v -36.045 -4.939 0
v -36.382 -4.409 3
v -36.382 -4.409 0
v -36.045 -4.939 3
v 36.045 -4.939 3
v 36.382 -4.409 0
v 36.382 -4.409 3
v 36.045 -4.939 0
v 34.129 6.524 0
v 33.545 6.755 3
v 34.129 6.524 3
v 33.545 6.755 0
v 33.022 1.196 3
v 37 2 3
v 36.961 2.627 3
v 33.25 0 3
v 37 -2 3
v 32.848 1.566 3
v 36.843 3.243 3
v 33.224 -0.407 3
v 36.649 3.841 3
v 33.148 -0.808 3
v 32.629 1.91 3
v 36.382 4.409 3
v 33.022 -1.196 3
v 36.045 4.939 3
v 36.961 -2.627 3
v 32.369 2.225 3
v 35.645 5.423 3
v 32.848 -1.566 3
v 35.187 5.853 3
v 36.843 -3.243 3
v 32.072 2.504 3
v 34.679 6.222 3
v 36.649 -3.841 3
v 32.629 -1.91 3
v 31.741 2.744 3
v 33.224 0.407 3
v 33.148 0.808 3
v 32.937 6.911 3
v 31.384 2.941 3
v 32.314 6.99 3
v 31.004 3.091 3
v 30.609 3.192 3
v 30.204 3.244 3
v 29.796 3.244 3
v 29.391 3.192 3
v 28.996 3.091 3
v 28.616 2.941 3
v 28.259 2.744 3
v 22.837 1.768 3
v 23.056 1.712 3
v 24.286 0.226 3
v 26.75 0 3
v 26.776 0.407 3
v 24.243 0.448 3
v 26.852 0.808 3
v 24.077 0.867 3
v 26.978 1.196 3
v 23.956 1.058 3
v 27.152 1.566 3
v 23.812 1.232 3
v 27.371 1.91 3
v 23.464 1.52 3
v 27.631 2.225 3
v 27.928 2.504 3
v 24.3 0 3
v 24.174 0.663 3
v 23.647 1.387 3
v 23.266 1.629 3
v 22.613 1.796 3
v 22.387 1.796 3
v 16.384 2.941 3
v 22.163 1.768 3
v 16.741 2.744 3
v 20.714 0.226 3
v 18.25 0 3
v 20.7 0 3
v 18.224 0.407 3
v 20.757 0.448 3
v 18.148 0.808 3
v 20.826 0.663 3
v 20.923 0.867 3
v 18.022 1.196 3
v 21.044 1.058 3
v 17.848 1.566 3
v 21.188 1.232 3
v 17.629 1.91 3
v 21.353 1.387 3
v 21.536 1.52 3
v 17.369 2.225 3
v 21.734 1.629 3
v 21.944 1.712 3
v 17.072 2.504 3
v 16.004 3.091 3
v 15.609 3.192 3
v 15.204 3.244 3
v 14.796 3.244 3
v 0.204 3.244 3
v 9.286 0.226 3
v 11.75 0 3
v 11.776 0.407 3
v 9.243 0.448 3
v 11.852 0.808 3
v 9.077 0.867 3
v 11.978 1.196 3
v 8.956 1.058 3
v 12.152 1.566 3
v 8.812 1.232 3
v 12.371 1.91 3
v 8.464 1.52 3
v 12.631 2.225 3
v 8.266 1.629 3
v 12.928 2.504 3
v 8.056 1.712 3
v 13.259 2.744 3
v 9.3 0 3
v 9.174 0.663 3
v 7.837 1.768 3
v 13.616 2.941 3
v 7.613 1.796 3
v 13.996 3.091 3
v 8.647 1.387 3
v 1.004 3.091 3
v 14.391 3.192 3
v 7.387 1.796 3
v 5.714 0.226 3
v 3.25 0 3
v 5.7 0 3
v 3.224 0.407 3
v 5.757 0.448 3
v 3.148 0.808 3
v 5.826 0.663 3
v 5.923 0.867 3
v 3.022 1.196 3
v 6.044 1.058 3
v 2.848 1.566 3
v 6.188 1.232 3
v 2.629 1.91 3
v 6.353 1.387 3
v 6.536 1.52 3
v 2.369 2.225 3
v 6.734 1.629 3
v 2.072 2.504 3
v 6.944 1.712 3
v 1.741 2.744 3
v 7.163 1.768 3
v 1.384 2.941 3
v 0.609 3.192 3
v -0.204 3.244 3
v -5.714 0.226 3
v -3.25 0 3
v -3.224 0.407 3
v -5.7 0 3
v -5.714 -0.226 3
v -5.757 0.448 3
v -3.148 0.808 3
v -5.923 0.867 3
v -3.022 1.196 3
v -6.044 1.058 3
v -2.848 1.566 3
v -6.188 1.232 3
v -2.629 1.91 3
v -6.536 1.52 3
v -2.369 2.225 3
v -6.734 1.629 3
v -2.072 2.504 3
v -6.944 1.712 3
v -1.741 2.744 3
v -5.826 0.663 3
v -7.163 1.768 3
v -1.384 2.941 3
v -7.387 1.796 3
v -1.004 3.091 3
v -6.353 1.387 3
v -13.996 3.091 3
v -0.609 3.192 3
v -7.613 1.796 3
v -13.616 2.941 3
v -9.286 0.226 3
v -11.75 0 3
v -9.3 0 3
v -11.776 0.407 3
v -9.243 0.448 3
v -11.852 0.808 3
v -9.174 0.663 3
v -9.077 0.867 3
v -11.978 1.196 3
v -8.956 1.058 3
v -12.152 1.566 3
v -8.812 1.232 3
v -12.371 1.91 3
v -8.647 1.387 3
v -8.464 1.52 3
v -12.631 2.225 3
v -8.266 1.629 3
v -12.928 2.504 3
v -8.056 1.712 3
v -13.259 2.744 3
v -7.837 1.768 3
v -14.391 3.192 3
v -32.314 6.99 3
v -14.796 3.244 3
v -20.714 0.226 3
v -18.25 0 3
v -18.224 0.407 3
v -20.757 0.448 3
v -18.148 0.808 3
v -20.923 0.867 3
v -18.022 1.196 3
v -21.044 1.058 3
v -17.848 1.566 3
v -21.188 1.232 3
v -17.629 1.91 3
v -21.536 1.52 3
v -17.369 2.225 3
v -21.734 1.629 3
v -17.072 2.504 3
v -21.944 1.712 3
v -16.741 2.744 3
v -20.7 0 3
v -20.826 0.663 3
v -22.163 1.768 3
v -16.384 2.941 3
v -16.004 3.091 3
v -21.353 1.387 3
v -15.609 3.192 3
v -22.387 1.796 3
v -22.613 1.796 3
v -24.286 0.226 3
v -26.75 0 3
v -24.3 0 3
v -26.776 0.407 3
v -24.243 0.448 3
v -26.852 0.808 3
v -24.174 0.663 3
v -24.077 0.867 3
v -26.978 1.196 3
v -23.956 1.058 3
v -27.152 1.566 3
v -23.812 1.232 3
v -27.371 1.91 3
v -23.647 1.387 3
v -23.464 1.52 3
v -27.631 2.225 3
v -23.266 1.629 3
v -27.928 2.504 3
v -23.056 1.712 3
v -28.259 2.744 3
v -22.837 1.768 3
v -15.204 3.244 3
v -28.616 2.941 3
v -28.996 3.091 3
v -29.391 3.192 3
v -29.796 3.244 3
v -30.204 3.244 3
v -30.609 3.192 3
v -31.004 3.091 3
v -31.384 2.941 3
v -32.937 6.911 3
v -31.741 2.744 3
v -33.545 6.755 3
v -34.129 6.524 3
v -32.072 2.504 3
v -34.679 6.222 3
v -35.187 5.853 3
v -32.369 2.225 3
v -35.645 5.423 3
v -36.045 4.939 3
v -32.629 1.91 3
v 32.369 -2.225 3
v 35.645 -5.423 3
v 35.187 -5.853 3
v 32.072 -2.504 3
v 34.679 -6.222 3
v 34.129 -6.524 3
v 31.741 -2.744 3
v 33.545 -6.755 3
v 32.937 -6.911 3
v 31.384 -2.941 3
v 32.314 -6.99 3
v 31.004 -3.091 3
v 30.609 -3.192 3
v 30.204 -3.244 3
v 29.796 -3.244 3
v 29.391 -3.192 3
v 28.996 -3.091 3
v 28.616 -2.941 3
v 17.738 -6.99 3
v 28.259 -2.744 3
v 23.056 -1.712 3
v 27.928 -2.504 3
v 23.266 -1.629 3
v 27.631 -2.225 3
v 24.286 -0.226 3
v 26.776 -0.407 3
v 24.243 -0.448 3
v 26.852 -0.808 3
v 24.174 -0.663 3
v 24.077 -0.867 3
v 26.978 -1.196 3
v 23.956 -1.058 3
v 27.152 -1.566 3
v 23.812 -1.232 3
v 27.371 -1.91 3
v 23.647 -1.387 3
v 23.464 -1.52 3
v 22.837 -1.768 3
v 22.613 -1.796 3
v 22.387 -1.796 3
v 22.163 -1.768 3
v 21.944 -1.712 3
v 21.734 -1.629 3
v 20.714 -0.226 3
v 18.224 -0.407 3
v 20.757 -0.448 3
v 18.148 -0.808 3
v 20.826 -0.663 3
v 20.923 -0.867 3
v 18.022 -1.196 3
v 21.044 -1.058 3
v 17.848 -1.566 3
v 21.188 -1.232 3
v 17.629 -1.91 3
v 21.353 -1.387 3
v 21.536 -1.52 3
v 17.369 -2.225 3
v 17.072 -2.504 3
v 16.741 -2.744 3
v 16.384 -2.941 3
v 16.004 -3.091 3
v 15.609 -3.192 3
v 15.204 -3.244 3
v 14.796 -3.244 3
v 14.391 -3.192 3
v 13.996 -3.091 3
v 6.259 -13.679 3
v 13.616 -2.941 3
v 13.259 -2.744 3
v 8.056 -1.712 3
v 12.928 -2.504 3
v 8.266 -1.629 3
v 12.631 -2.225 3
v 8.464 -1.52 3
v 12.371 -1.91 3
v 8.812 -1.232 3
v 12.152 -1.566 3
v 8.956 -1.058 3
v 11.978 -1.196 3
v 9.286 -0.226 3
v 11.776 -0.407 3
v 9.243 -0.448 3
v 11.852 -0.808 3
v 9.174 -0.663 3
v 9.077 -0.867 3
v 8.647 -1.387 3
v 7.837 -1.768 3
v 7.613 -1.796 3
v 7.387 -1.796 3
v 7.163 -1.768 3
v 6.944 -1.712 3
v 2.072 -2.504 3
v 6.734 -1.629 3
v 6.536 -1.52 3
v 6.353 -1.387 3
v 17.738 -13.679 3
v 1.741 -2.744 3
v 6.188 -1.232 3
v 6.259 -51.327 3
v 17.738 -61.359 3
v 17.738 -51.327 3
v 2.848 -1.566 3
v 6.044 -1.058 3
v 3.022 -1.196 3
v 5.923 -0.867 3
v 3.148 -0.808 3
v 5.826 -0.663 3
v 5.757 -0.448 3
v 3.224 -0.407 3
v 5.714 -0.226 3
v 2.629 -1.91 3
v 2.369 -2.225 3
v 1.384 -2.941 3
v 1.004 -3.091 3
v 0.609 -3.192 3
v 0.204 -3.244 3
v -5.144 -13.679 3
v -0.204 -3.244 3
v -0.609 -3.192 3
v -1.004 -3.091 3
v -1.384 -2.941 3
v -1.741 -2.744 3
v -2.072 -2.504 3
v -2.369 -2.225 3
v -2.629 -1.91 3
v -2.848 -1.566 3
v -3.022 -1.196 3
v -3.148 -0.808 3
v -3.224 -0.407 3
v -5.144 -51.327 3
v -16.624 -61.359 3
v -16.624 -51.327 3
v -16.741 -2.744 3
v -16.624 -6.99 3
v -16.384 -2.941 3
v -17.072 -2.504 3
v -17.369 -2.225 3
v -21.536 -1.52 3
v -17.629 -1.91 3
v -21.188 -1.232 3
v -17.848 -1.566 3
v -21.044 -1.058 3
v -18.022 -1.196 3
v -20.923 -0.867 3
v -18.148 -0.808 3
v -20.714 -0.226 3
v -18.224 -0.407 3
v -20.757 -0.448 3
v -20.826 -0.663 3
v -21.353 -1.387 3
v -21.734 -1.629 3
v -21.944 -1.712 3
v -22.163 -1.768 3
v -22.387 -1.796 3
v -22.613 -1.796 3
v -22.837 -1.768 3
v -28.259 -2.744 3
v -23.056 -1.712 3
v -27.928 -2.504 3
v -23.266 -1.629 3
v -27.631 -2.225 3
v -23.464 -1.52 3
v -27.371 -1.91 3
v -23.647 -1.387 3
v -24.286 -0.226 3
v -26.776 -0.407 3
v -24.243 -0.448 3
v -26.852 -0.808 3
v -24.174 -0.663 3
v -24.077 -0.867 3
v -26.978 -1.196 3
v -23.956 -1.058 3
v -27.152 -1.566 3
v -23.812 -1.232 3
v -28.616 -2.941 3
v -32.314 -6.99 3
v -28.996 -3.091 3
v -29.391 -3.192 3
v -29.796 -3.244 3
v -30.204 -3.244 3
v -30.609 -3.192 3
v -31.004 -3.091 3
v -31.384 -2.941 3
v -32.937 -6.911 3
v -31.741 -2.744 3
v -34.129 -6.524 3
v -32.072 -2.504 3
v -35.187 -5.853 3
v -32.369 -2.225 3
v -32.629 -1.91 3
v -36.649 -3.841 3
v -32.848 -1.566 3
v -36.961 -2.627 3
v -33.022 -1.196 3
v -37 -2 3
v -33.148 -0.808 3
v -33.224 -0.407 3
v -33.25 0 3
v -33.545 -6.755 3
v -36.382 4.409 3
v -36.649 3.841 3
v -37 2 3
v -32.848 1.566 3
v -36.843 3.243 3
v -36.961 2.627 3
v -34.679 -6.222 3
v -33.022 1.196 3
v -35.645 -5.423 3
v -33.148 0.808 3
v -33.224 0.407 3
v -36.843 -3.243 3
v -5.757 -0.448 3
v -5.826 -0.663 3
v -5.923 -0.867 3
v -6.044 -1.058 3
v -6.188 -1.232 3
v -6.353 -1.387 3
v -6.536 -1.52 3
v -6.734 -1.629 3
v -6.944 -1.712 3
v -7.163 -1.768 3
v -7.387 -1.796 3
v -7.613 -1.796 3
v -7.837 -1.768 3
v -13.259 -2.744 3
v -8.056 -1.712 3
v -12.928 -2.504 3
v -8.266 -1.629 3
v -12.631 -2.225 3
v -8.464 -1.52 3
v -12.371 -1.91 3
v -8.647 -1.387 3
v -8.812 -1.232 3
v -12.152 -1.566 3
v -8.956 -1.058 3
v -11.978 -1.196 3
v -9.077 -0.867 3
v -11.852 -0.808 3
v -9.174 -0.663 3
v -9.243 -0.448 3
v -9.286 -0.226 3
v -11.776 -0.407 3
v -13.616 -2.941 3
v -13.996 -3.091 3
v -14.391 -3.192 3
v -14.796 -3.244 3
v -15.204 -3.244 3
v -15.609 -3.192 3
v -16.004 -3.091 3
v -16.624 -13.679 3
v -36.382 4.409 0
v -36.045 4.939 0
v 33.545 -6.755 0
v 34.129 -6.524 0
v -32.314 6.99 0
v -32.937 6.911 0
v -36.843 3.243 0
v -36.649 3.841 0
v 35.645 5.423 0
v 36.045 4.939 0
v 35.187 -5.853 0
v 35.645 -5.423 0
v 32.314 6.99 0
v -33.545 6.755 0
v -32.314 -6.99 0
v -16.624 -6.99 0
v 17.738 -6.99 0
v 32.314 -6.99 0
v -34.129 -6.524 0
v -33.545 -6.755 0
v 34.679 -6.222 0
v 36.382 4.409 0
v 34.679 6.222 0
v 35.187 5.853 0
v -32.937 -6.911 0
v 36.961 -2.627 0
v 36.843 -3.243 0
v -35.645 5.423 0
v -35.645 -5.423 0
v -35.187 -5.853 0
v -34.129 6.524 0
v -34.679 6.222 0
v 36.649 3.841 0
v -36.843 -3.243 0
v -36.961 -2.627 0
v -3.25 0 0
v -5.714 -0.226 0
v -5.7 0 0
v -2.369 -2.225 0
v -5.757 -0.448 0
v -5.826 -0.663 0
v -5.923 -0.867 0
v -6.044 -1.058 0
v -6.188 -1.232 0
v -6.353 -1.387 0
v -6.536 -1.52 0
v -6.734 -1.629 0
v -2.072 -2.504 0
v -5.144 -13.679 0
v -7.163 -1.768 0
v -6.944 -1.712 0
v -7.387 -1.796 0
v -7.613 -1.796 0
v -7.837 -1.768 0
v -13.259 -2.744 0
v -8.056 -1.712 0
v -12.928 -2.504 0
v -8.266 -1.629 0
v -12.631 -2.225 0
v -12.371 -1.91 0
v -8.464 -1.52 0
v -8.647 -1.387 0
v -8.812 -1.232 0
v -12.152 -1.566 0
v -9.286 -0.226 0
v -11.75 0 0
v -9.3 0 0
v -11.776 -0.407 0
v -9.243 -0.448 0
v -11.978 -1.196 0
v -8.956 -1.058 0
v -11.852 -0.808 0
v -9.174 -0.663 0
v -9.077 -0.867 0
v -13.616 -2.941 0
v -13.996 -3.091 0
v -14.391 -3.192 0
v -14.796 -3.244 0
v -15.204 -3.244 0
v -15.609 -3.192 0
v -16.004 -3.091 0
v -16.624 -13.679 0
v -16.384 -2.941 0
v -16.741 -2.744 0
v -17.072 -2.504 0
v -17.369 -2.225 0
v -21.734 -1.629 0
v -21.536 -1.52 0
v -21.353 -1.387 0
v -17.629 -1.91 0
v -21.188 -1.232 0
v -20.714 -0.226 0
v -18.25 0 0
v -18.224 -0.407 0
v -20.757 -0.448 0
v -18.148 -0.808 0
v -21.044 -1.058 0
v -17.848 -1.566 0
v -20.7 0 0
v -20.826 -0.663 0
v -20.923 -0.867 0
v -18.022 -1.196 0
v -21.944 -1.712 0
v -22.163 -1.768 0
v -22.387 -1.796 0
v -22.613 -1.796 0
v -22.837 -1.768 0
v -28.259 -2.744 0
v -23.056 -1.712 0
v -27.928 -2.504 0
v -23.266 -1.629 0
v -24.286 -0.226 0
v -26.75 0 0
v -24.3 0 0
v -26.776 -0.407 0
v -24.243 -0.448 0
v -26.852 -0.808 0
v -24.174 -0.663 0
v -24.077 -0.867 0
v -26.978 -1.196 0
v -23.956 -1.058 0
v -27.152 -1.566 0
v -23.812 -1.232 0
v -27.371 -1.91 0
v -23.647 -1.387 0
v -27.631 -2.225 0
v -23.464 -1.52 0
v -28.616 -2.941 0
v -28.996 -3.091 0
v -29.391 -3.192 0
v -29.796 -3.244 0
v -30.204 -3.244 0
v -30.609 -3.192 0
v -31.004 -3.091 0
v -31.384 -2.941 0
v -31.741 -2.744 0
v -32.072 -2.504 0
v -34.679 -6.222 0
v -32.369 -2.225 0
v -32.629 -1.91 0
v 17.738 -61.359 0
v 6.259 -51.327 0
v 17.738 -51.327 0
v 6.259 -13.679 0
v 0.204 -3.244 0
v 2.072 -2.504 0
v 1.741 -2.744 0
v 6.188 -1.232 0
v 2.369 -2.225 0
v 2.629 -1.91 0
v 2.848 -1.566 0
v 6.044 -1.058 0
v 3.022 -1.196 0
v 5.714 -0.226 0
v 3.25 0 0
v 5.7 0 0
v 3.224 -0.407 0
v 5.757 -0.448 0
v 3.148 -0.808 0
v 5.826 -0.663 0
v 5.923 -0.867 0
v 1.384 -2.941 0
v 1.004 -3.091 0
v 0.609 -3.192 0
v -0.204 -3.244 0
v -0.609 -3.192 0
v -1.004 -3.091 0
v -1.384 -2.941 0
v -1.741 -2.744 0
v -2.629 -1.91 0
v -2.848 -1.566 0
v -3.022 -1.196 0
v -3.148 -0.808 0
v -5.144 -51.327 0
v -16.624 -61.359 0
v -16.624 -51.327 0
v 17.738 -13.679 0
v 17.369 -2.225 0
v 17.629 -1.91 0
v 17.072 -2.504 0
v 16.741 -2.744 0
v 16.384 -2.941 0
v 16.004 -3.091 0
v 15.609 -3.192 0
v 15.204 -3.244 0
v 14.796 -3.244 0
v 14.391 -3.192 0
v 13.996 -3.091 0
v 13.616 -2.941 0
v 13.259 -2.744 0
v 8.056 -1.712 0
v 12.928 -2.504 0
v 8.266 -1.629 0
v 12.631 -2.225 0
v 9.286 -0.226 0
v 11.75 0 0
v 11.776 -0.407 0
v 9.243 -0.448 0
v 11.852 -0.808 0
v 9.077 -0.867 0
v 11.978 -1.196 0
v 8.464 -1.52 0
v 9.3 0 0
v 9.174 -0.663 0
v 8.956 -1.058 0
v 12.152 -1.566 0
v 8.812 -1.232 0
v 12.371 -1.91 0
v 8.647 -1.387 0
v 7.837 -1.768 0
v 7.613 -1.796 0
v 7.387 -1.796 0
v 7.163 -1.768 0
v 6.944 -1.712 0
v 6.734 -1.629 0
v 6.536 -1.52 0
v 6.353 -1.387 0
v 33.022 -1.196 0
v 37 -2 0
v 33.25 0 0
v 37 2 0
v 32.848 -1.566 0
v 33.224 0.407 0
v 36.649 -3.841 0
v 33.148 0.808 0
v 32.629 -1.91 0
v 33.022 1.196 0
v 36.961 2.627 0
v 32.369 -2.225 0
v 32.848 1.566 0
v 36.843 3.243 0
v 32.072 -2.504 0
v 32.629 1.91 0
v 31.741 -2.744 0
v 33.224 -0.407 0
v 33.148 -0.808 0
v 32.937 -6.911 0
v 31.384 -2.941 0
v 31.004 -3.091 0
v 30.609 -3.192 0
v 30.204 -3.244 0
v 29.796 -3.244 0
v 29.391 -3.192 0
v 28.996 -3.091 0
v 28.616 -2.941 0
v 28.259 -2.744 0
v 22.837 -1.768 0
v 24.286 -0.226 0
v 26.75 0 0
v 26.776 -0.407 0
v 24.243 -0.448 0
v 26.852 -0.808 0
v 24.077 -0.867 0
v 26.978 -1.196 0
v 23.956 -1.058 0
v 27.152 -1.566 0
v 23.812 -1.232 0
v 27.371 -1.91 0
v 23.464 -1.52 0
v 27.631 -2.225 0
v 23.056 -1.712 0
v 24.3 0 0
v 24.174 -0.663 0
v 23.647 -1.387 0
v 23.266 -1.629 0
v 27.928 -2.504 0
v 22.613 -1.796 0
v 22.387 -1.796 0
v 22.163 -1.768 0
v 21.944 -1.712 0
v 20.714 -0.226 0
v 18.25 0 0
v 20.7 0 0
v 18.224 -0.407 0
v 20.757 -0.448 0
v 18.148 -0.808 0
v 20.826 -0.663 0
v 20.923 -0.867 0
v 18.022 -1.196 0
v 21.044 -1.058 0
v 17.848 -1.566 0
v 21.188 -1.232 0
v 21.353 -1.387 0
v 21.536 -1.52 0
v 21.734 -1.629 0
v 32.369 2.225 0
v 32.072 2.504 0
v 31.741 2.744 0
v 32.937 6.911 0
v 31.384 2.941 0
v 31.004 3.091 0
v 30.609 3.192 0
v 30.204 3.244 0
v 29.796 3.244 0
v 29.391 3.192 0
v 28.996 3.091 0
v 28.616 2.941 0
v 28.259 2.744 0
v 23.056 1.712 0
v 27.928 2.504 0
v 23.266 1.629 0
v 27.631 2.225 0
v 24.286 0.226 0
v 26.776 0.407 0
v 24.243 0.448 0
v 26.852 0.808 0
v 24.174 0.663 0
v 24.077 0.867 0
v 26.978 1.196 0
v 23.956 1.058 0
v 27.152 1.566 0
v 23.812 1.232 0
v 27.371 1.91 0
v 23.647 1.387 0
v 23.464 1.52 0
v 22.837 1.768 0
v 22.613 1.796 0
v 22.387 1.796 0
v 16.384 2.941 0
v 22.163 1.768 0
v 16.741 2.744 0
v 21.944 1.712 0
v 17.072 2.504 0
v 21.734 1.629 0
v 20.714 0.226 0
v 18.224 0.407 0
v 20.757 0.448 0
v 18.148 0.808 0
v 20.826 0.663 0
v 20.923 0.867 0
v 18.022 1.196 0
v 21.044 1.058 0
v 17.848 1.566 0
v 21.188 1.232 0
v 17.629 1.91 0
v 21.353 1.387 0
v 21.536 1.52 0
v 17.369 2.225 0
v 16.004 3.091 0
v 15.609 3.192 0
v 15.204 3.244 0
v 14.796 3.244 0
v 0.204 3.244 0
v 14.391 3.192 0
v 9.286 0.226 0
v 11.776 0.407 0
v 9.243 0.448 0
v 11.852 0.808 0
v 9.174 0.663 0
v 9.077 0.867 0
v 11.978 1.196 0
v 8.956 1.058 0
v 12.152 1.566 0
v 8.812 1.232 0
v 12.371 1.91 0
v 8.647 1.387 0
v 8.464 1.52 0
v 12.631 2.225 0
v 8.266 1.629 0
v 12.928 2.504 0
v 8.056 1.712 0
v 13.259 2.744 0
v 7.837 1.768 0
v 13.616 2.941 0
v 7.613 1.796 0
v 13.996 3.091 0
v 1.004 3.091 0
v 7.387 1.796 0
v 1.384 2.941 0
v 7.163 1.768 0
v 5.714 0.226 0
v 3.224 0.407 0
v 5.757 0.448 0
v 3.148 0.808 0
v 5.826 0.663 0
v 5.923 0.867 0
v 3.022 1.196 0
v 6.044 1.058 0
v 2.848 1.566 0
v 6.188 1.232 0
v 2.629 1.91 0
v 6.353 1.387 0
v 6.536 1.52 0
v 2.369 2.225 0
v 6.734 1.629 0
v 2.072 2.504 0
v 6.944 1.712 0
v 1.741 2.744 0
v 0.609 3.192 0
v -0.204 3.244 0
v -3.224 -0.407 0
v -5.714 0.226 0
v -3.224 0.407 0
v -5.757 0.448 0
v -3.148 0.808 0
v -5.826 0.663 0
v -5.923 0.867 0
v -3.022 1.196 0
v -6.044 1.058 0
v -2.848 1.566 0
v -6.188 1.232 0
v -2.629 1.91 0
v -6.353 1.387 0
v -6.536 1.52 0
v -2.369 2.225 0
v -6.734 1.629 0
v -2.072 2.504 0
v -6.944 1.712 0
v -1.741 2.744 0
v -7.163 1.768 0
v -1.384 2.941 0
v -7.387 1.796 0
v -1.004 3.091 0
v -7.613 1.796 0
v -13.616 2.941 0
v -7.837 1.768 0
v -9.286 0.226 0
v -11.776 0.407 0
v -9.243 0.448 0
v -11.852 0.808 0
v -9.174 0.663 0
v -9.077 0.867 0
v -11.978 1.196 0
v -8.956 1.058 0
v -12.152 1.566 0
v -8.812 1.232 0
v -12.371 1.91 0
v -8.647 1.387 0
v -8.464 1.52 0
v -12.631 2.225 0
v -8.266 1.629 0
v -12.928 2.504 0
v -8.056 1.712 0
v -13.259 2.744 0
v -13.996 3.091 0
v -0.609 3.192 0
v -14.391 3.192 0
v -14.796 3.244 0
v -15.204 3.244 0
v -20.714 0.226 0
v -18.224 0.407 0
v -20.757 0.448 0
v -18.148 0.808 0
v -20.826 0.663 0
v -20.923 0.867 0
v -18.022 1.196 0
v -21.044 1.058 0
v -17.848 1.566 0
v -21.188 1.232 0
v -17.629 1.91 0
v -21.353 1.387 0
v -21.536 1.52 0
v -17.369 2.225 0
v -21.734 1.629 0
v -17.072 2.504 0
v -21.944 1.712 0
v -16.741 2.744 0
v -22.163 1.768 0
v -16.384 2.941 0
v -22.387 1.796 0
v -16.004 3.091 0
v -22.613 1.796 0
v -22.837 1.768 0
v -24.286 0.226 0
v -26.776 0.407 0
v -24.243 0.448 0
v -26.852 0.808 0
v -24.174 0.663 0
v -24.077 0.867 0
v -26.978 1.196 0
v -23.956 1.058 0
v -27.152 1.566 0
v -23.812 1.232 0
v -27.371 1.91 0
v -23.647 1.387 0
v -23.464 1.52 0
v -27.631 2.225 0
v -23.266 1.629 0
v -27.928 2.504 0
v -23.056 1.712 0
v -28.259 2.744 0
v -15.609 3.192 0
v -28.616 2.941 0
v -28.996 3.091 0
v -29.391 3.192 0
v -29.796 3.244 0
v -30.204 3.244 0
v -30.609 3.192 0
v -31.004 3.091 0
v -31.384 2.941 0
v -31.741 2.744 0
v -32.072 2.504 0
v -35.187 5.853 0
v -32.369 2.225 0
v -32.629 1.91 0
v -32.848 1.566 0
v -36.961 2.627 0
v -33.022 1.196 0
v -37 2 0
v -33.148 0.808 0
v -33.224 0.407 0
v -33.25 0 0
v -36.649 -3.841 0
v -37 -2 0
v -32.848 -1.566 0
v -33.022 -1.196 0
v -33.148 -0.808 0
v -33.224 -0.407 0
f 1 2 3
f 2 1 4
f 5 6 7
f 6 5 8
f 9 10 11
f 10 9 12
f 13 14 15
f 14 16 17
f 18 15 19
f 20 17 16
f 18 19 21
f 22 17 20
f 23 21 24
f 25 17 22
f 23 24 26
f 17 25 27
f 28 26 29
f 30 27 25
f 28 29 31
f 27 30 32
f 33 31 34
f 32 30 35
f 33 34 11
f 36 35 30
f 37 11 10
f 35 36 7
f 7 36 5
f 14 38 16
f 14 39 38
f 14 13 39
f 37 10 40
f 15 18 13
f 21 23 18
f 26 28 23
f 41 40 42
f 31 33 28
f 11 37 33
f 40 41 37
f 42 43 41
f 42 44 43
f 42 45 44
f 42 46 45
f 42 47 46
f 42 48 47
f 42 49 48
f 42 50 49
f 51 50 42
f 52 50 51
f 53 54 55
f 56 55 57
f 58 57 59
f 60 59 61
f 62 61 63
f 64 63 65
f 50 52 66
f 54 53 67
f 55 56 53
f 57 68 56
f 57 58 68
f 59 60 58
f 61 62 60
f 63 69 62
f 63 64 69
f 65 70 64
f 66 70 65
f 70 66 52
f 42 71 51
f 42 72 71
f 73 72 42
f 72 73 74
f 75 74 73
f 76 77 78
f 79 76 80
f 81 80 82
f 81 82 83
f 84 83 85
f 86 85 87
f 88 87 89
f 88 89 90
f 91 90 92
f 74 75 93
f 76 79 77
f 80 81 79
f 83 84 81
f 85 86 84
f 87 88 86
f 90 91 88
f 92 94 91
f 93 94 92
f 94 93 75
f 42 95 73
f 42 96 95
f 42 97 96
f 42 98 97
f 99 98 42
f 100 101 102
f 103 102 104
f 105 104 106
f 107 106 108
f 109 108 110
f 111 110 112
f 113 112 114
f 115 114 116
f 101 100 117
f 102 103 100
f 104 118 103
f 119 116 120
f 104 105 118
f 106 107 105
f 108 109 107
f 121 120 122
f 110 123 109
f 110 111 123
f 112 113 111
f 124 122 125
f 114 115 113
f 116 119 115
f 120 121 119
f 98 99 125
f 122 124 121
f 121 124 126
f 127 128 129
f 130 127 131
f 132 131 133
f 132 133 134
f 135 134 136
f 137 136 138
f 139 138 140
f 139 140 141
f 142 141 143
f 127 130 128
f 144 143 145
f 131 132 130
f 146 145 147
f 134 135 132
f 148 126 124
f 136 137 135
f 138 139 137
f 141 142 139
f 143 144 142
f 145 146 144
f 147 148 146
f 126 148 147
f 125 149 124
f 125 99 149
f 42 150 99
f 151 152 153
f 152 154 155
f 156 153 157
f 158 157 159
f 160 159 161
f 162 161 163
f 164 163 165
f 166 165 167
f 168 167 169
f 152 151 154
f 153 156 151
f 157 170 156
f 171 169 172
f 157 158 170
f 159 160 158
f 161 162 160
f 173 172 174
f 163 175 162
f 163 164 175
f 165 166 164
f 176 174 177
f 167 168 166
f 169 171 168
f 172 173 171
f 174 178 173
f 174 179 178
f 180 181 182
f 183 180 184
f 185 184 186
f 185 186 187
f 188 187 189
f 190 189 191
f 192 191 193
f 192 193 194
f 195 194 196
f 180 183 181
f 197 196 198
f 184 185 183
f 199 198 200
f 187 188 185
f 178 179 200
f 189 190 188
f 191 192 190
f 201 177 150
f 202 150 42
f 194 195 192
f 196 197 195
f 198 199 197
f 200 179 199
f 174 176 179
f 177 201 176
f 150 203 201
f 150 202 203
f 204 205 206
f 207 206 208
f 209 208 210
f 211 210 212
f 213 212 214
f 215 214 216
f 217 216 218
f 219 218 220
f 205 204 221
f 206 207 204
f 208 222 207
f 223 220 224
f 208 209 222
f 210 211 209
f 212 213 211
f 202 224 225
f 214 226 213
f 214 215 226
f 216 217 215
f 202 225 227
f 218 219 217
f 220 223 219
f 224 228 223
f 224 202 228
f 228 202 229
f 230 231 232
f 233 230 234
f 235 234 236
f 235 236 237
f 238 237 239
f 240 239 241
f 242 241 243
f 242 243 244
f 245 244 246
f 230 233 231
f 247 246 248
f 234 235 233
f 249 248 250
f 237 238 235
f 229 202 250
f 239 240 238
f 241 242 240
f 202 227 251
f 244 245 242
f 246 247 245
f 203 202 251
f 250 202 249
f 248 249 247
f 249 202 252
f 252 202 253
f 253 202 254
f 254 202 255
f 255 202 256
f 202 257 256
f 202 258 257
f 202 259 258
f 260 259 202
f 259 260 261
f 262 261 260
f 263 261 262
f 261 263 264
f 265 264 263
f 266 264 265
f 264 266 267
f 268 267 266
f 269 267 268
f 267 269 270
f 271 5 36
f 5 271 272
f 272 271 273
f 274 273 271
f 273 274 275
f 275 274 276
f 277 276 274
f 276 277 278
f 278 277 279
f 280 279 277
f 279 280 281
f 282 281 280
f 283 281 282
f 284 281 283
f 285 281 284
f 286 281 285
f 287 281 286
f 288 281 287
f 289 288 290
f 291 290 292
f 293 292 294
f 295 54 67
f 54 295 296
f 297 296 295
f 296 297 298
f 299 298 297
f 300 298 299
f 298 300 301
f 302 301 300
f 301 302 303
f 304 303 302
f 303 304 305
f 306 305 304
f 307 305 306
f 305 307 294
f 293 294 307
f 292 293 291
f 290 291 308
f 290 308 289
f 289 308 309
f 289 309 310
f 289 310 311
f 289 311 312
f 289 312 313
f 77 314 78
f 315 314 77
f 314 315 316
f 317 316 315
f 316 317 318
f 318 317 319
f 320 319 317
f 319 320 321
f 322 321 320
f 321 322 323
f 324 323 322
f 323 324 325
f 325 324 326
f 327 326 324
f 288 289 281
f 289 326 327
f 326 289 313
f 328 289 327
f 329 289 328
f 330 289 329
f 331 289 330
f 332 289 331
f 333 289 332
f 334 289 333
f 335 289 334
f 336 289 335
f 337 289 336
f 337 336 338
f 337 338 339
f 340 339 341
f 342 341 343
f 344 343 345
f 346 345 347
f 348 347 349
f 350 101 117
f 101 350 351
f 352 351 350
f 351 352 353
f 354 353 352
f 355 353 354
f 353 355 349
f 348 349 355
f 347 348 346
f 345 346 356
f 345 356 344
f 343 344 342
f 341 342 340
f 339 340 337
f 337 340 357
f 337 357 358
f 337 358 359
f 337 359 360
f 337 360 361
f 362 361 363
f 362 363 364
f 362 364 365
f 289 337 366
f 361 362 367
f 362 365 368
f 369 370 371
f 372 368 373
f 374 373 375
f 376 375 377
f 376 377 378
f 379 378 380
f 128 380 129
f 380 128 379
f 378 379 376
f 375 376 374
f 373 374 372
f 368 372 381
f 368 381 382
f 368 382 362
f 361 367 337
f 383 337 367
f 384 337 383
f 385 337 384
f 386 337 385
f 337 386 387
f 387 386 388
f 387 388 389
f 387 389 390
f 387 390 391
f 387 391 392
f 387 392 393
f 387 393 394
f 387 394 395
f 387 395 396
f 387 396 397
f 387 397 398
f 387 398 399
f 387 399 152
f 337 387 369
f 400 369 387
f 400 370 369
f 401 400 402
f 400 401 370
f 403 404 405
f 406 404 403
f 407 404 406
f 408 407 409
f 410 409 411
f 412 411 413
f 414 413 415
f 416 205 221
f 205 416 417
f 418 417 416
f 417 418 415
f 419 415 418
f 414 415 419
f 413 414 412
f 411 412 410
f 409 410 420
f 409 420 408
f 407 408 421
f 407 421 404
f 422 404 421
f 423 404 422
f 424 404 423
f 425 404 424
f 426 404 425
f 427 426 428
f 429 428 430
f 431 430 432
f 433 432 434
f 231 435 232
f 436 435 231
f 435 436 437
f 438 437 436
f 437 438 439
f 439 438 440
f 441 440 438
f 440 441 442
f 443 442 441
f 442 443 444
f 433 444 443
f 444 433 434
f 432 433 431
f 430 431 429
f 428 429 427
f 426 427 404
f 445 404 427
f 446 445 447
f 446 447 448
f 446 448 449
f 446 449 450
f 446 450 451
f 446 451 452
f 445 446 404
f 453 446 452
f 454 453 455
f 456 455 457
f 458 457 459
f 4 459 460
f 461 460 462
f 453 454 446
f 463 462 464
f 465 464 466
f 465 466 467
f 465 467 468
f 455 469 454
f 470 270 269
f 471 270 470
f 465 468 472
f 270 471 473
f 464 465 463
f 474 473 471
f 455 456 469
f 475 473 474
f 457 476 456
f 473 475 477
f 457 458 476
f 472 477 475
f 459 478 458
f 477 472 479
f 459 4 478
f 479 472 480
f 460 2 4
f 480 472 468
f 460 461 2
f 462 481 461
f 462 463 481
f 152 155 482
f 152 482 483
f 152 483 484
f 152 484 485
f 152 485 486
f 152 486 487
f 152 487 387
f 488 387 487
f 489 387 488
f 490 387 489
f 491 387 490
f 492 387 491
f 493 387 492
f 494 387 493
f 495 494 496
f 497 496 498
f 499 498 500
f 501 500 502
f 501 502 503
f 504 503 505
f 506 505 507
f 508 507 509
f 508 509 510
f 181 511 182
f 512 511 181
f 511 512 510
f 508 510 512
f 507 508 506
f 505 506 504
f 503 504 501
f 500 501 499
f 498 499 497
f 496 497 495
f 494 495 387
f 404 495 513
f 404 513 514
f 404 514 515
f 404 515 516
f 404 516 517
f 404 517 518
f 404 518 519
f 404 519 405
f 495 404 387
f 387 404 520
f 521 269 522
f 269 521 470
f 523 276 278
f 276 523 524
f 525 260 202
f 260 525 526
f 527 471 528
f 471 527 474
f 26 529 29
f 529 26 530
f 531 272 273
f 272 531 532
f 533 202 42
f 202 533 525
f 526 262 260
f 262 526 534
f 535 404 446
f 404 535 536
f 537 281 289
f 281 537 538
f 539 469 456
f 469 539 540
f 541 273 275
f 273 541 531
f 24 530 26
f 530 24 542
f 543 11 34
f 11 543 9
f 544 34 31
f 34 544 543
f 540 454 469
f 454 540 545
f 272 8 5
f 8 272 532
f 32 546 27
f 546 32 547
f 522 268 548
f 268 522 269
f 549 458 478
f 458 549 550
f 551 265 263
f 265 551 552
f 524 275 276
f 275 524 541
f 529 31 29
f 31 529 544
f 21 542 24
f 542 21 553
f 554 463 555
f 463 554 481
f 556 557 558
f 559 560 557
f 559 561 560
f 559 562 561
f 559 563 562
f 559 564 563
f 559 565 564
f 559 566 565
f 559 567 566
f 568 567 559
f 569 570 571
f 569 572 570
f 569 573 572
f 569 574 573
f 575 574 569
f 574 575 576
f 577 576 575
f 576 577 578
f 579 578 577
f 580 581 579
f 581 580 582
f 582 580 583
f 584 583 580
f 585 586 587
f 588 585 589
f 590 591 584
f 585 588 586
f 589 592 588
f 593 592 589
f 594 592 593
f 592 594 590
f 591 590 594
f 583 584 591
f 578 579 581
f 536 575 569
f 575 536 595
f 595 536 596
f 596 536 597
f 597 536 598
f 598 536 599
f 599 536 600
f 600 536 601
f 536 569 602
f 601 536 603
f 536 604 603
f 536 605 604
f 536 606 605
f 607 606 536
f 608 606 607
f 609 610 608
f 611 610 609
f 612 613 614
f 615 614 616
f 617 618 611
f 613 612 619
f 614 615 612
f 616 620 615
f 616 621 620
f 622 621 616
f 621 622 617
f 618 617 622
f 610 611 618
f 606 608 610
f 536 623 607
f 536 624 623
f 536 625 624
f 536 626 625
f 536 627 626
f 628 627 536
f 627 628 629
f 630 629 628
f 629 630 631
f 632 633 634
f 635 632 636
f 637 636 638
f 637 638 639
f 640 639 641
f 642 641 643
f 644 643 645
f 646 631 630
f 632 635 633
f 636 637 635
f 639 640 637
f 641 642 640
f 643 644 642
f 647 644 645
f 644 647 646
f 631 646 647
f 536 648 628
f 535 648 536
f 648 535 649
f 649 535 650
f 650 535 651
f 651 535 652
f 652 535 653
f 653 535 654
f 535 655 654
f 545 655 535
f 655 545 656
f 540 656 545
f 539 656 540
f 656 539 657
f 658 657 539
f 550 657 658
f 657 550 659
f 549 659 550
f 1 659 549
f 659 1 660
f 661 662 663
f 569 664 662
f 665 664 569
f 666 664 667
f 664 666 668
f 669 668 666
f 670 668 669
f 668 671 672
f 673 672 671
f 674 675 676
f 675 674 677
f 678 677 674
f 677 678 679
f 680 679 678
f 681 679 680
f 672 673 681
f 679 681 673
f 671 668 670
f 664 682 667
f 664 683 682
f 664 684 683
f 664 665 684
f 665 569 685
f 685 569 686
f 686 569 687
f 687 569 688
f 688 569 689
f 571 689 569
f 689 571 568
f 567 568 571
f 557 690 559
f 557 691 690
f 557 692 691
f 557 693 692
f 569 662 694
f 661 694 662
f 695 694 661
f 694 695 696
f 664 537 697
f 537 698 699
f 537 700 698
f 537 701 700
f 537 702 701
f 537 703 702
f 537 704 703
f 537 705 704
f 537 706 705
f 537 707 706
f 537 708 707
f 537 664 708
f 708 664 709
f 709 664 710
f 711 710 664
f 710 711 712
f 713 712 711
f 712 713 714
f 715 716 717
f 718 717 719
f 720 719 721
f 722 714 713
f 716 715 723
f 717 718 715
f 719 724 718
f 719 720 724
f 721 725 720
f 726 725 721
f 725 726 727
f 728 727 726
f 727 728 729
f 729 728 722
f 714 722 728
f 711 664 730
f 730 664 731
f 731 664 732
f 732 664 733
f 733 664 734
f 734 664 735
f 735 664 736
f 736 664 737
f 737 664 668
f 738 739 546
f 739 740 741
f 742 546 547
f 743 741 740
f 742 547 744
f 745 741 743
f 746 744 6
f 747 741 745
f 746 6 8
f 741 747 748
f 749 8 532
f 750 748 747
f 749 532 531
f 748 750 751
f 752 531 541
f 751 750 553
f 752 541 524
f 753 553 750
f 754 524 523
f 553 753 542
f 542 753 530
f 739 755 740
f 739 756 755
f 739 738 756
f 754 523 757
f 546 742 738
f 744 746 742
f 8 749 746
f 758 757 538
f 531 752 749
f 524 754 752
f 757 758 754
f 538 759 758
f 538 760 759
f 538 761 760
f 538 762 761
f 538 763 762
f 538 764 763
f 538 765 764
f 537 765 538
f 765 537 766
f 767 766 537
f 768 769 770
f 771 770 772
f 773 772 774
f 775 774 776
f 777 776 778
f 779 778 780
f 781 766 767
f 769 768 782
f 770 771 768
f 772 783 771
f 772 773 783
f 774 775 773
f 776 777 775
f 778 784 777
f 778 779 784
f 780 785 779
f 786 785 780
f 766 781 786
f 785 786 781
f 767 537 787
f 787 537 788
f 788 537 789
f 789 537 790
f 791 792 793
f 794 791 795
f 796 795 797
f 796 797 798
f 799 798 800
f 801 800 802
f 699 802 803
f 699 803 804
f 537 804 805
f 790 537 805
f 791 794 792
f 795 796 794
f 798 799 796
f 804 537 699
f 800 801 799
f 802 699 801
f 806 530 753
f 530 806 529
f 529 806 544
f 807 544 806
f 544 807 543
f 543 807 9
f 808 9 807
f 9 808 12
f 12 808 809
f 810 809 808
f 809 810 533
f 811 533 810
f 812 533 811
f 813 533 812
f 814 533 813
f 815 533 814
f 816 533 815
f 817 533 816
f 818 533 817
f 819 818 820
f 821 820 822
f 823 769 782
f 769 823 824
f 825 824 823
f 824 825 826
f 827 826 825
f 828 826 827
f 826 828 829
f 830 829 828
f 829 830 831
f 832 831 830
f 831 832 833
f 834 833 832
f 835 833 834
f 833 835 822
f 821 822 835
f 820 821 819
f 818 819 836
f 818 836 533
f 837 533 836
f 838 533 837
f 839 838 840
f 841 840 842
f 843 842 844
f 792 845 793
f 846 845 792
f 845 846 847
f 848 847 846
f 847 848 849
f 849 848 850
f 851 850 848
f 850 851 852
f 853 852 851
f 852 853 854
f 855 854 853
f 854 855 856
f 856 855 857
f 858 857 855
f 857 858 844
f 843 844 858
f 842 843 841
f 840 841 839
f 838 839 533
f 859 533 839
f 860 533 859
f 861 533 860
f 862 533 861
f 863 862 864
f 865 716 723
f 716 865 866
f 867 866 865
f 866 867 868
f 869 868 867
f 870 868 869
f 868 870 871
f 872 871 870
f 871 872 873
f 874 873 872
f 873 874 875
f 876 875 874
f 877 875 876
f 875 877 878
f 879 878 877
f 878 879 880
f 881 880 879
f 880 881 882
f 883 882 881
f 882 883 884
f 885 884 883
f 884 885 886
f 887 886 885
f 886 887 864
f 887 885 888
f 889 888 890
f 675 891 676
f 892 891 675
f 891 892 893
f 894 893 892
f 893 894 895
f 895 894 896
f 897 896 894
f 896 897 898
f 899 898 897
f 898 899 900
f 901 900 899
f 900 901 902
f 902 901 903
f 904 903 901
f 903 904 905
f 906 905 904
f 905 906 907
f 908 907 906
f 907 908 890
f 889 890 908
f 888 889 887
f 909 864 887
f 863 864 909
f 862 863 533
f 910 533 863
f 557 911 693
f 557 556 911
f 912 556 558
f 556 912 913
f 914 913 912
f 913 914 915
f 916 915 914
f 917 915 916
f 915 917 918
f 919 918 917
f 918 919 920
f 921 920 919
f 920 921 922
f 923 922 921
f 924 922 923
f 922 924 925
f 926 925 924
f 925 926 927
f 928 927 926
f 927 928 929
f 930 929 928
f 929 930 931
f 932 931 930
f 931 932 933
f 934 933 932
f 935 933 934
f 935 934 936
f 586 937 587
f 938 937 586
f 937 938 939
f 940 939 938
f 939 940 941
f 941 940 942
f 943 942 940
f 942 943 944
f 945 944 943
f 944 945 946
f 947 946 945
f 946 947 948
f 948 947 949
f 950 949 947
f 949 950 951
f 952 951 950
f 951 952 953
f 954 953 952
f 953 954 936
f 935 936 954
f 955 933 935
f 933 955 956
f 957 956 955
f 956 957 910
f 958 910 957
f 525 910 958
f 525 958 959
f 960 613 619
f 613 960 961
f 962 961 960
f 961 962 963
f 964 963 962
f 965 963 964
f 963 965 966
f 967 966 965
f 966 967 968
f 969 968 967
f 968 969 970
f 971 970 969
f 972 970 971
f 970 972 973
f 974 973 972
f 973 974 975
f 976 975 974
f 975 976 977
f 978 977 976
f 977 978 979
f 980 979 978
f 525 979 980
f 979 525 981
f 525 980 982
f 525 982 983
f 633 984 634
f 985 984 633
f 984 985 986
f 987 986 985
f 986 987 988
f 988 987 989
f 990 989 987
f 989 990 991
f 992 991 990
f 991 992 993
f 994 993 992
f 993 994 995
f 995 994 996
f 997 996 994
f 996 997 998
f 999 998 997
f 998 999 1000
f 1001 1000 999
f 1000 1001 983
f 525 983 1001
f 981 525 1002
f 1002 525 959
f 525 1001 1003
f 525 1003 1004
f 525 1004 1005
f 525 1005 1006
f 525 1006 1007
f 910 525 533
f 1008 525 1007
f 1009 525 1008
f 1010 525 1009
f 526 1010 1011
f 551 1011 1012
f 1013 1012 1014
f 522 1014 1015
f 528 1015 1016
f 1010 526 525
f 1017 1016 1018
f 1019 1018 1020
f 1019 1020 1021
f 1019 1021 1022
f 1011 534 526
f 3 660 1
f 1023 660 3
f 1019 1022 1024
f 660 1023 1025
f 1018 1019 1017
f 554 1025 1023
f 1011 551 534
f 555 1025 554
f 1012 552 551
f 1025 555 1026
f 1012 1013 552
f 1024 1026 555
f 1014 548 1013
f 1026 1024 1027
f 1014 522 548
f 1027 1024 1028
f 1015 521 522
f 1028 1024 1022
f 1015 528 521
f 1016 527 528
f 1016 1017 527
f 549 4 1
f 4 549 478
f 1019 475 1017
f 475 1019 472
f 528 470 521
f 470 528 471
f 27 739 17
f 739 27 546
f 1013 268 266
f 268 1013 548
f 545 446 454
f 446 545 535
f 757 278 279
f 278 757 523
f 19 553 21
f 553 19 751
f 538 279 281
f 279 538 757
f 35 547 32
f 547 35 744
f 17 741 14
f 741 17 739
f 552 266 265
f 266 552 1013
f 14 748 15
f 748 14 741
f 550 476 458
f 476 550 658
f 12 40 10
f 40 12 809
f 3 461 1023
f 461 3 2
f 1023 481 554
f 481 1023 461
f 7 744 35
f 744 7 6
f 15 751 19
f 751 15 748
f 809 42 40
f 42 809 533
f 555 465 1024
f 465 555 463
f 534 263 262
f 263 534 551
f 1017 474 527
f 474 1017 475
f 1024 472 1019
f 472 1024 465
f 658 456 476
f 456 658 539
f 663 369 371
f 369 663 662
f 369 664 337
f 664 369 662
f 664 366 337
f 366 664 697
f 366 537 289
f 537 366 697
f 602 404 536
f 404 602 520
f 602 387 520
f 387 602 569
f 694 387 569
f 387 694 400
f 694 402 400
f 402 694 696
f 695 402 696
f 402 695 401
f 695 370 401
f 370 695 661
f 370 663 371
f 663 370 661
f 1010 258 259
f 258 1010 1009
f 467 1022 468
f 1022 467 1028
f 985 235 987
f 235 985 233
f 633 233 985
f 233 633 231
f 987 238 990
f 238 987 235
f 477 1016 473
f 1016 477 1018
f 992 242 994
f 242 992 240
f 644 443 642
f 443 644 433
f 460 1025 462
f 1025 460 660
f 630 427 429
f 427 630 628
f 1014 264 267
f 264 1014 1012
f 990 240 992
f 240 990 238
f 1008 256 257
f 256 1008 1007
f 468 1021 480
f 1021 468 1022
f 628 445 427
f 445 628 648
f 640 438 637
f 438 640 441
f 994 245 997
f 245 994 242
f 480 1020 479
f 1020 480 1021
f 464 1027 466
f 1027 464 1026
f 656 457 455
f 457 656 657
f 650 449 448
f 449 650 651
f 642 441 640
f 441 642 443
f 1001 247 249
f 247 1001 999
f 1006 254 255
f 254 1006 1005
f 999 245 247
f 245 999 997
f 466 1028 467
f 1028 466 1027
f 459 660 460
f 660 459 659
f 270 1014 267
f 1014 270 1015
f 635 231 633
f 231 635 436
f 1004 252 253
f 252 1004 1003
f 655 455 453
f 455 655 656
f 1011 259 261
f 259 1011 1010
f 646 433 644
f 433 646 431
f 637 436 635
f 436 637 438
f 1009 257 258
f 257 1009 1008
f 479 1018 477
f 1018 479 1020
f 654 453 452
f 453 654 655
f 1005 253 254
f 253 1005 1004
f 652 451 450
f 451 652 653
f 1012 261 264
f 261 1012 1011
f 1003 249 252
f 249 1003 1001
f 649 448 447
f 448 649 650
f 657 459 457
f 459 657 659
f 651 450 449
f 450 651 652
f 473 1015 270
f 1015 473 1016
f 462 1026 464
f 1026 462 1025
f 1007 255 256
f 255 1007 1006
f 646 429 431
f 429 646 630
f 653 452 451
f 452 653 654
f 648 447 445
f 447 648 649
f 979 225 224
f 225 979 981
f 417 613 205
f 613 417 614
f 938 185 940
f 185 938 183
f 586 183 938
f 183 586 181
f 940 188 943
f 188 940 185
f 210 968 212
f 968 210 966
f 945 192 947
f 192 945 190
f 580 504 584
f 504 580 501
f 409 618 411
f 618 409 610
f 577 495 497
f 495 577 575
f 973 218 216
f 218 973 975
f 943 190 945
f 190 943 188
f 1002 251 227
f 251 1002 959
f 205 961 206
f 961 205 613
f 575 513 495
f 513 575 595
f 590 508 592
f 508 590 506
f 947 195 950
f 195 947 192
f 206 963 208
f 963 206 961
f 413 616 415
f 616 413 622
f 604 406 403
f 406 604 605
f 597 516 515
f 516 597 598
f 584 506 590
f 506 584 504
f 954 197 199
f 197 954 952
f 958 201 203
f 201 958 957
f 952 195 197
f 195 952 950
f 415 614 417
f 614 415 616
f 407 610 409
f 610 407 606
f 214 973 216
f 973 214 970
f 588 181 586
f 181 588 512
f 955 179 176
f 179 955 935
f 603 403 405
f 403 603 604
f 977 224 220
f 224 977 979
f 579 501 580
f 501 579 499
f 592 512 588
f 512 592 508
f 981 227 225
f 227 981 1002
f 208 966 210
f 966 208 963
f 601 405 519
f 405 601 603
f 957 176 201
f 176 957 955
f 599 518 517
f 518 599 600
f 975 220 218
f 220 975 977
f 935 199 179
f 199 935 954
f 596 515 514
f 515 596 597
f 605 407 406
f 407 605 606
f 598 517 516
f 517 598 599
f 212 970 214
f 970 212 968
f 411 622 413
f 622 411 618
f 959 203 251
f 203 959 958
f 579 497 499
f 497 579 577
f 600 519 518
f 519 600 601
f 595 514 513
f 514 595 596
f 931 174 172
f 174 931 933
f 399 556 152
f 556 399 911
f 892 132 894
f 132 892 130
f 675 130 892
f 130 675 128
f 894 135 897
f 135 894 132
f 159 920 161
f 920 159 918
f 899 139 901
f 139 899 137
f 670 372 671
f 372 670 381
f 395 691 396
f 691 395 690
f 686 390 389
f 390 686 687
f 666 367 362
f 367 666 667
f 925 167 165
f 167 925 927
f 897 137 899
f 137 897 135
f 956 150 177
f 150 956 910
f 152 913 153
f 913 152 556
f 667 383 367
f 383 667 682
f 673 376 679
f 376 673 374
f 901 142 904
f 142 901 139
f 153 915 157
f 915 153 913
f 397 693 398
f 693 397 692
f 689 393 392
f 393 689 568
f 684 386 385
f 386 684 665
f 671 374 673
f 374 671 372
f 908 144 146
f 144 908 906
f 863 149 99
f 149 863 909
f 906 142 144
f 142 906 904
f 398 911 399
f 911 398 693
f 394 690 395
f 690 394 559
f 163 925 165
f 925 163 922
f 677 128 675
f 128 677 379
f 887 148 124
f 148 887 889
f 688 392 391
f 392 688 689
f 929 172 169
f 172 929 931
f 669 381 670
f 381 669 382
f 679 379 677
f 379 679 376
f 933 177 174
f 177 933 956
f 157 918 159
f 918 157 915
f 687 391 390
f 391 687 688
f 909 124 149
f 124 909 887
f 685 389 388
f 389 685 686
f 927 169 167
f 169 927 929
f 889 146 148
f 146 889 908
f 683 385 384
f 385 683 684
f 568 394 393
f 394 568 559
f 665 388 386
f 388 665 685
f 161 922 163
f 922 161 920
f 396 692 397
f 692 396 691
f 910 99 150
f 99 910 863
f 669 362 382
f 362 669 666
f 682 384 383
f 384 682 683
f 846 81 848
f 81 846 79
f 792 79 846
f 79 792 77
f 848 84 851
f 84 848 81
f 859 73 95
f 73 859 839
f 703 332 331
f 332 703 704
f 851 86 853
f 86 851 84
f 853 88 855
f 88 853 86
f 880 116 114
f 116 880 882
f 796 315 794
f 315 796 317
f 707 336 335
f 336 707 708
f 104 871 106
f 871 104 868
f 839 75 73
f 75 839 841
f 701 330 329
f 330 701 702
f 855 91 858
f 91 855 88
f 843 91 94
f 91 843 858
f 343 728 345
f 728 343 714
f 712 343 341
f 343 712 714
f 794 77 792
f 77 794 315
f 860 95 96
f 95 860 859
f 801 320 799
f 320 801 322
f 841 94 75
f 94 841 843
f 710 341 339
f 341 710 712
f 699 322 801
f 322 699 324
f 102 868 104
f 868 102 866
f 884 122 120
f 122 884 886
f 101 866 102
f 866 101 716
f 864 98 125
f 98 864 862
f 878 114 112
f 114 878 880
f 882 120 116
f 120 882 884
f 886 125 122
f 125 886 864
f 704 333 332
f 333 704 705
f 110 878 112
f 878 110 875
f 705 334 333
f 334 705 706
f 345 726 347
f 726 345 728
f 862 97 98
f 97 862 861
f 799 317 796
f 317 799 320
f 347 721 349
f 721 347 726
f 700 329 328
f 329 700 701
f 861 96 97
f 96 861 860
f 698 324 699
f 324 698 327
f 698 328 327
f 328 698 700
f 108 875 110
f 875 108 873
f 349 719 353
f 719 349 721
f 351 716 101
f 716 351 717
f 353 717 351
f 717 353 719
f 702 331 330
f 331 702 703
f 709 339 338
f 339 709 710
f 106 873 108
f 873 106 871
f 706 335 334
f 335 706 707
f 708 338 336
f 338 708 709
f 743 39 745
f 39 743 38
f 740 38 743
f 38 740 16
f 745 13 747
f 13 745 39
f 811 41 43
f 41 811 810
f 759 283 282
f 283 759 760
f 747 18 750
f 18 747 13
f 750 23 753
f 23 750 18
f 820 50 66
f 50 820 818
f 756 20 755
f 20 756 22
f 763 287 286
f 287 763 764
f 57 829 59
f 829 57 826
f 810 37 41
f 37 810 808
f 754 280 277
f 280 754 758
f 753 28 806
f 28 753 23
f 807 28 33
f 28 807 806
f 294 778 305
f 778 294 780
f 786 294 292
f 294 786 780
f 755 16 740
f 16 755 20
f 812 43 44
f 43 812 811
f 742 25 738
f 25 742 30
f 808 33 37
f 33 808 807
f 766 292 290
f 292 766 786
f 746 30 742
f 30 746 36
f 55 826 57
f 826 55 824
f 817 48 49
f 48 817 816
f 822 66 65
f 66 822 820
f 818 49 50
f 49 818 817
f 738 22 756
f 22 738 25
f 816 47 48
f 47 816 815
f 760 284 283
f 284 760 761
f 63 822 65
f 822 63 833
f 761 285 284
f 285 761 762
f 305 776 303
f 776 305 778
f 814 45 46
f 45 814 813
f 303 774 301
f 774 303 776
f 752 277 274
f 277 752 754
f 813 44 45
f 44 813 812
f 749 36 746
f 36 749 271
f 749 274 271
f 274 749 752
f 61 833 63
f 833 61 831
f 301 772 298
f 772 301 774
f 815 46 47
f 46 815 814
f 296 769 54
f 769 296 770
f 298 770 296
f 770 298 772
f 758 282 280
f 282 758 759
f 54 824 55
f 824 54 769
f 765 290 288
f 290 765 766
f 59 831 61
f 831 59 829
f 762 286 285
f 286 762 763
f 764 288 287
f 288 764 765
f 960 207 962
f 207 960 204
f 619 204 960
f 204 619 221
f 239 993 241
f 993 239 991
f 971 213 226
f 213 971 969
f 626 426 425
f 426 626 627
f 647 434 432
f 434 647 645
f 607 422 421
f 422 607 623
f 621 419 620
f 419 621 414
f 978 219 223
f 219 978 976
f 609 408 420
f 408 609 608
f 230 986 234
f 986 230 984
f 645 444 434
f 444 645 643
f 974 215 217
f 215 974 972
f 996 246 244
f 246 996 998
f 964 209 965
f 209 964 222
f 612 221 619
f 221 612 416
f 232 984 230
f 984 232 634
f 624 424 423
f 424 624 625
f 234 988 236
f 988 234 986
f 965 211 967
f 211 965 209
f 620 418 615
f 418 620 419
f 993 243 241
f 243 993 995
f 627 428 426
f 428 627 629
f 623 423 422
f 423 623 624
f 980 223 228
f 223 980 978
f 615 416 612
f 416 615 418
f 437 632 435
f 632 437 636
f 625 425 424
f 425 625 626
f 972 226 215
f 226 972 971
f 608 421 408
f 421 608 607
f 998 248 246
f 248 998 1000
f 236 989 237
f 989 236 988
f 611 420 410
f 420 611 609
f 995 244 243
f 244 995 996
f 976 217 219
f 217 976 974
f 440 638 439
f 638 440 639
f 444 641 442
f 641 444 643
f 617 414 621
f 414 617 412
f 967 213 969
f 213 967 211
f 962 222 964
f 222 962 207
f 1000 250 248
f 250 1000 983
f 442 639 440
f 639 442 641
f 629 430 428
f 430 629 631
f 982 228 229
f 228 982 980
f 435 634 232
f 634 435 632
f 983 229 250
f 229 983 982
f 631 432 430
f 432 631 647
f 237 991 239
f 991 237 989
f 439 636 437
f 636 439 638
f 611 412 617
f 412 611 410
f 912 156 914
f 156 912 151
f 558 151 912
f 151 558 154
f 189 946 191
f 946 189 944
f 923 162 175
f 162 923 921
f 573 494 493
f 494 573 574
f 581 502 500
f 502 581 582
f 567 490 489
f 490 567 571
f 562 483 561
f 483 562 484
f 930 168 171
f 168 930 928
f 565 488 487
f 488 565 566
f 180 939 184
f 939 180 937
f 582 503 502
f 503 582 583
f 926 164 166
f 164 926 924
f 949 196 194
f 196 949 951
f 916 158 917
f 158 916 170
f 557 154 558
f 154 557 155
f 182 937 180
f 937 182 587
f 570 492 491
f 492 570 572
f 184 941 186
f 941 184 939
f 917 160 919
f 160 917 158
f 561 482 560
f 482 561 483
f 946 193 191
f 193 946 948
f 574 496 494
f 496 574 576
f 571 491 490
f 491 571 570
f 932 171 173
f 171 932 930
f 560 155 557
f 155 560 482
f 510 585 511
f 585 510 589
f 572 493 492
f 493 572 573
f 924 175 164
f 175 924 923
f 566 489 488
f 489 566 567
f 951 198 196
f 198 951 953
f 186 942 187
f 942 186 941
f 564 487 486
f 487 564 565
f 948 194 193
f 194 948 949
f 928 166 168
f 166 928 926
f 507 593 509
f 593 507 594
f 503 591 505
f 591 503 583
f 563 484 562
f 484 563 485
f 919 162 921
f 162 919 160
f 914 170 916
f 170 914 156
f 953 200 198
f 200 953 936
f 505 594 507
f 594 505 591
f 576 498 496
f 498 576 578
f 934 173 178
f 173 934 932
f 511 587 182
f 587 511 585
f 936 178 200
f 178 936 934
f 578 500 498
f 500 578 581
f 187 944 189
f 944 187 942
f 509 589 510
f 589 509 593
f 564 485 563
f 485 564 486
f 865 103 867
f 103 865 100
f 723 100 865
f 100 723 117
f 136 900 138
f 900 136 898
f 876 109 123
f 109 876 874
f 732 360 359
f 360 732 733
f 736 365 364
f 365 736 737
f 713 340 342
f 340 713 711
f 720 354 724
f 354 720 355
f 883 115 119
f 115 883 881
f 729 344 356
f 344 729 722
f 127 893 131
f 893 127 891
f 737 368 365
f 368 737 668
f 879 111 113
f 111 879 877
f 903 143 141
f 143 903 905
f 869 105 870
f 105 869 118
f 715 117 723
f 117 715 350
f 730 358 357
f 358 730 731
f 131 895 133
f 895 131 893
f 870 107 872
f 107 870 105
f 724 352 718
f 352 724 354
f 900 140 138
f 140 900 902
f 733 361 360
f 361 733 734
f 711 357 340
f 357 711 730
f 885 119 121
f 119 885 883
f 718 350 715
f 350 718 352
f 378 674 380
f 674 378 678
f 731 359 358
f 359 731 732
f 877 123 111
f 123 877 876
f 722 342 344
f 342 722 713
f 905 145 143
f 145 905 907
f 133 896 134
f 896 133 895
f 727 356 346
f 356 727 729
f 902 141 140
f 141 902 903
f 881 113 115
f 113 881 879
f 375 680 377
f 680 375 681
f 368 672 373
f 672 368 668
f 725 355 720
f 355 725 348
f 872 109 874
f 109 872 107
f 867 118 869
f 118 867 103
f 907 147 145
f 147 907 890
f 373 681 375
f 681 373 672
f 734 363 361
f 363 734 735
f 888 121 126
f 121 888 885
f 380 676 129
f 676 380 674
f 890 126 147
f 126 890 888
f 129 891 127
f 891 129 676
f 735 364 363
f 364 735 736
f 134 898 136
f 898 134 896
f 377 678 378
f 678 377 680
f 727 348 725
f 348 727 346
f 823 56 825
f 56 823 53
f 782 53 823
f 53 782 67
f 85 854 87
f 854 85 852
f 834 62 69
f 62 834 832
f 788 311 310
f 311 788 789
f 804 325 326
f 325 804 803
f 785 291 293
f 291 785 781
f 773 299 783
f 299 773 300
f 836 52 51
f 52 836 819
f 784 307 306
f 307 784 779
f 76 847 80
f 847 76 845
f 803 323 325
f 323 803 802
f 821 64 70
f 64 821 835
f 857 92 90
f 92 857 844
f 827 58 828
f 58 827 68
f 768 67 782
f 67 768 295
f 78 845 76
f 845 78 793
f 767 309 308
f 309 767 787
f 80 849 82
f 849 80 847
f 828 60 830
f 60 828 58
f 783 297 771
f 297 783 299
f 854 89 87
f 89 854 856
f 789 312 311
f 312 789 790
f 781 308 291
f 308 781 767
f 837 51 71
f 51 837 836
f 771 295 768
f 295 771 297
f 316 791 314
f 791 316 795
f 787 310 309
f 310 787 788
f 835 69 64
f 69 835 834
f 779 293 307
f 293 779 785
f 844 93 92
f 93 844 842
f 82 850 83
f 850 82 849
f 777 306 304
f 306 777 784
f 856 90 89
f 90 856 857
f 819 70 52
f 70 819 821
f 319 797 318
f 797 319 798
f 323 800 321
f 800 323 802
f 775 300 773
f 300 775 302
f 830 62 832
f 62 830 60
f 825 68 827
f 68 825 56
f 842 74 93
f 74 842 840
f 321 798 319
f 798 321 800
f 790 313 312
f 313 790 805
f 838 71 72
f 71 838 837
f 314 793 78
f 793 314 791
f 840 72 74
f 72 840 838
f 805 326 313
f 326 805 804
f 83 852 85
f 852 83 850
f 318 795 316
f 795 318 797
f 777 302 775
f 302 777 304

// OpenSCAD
$fn = 50;


difference() {
	union() {
		hull() {
			translate(v = [-32.0000000000, 2.0000000000, 0]) {
				cylinder(h = 3, r = 5);
			}
			translate(v = [32.0000000000, 2.0000000000, 0]) {
				cylinder(h = 3, r = 5);
			}
			translate(v = [-32.0000000000, -2.0000000000, 0]) {
				cylinder(h = 3, r = 5);
			}
			translate(v = [32.0000000000, -2.0000000000, 0]) {
				cylinder(h = 3, r = 5);
			}
		}
		translate(v = [0, -5, 0]) {
			linear_extrude(height = 3) {
				text(font = "DejaVu Sans Mono:style=Bold", halign = "center", size = 57.0000000000, text = "I", valign = "top");
			}
		}
	}
	union() {
		translate(v = [-30.0000000000, 0.0000000000, 0]) {
			translate(v = [0, 0, -100]) {
				cylinder(h = 200, r = 3.2500000000);
			}
		}
		translate(v = [-15.0000000000, 0.0000000000, 0]) {
			translate(v = [0, 0, -100]) {
				cylinder(h = 200, r = 3.2500000000);
			}
		}
		translate(v = [0, 0, -100]) {
			cylinder(h = 200, r = 3.2500000000);
		}
		translate(v = [15.0000000000, 0.0000000000, 0]) {
			translate(v = [0, 0, -100]) {
				cylinder(h = 200, r = 3.2500000000);
			}
		}
		translate(v = [30.0000000000, 0.0000000000, 0]) {
			translate(v = [0, 0, -100]) {
				cylinder(h = 200, r = 3.2500000000);
			}
		}
		translate(v = [-30.0000000000, 0.0000000000, 0]) {
			translate(v = [0, 0, -100]) {
				cylinder(h = 200, r = 1.8000000000);
			}
		}
		translate(v = [-22.5000000000, 0.0000000000, 0]) {
			translate(v = [0, 0, -100]) {
				cylinder(h = 200, r = 1.8000000000);
			}
		}
		translate(v = [-15.0000000000, 0.0000000000, 0]) {
			translate(v = [0, 0, -100]) {
				cylinder(h = 200, r = 1.8000000000);
			}
		}
		translate(v = [-7.5000000000, 0.0000000000, 0]) {
			translate(v = [0, 0, -100]) {
				cylinder(h = 200, r = 1.8000000000);
			}
		}
		translate(v = [0, 0, -100]) {
			cylinder(h = 200, r = 1.8000000000);
		}
		translate(v = [7.5000000000, 0.0000000000, 0]) {
			translate(v = [0, 0, -100]) {
				cylinder(h = 200, r = 1.8000000000);
			}
		}
		translate(v = [15.0000000000, 0.0000000000, 0]) {
			translate(v = [0, 0, -100]) {
				cylinder(h = 200, r = 1.8000000000);
			}
		}
		translate(v = [22.5000000000, 0.0000000000, 0]) {
			translate(v = [0, 0, -100]) {
				cylinder(h = 200, r = 1.8000000000);
			}
		}
		translate(v = [30.0000000000, 0.0000000000, 0]) {
			translate(v = [0, 0, -100]) {
				cylinder(h = 200, r = 1.8000000000);
			}
		}
	}
}
